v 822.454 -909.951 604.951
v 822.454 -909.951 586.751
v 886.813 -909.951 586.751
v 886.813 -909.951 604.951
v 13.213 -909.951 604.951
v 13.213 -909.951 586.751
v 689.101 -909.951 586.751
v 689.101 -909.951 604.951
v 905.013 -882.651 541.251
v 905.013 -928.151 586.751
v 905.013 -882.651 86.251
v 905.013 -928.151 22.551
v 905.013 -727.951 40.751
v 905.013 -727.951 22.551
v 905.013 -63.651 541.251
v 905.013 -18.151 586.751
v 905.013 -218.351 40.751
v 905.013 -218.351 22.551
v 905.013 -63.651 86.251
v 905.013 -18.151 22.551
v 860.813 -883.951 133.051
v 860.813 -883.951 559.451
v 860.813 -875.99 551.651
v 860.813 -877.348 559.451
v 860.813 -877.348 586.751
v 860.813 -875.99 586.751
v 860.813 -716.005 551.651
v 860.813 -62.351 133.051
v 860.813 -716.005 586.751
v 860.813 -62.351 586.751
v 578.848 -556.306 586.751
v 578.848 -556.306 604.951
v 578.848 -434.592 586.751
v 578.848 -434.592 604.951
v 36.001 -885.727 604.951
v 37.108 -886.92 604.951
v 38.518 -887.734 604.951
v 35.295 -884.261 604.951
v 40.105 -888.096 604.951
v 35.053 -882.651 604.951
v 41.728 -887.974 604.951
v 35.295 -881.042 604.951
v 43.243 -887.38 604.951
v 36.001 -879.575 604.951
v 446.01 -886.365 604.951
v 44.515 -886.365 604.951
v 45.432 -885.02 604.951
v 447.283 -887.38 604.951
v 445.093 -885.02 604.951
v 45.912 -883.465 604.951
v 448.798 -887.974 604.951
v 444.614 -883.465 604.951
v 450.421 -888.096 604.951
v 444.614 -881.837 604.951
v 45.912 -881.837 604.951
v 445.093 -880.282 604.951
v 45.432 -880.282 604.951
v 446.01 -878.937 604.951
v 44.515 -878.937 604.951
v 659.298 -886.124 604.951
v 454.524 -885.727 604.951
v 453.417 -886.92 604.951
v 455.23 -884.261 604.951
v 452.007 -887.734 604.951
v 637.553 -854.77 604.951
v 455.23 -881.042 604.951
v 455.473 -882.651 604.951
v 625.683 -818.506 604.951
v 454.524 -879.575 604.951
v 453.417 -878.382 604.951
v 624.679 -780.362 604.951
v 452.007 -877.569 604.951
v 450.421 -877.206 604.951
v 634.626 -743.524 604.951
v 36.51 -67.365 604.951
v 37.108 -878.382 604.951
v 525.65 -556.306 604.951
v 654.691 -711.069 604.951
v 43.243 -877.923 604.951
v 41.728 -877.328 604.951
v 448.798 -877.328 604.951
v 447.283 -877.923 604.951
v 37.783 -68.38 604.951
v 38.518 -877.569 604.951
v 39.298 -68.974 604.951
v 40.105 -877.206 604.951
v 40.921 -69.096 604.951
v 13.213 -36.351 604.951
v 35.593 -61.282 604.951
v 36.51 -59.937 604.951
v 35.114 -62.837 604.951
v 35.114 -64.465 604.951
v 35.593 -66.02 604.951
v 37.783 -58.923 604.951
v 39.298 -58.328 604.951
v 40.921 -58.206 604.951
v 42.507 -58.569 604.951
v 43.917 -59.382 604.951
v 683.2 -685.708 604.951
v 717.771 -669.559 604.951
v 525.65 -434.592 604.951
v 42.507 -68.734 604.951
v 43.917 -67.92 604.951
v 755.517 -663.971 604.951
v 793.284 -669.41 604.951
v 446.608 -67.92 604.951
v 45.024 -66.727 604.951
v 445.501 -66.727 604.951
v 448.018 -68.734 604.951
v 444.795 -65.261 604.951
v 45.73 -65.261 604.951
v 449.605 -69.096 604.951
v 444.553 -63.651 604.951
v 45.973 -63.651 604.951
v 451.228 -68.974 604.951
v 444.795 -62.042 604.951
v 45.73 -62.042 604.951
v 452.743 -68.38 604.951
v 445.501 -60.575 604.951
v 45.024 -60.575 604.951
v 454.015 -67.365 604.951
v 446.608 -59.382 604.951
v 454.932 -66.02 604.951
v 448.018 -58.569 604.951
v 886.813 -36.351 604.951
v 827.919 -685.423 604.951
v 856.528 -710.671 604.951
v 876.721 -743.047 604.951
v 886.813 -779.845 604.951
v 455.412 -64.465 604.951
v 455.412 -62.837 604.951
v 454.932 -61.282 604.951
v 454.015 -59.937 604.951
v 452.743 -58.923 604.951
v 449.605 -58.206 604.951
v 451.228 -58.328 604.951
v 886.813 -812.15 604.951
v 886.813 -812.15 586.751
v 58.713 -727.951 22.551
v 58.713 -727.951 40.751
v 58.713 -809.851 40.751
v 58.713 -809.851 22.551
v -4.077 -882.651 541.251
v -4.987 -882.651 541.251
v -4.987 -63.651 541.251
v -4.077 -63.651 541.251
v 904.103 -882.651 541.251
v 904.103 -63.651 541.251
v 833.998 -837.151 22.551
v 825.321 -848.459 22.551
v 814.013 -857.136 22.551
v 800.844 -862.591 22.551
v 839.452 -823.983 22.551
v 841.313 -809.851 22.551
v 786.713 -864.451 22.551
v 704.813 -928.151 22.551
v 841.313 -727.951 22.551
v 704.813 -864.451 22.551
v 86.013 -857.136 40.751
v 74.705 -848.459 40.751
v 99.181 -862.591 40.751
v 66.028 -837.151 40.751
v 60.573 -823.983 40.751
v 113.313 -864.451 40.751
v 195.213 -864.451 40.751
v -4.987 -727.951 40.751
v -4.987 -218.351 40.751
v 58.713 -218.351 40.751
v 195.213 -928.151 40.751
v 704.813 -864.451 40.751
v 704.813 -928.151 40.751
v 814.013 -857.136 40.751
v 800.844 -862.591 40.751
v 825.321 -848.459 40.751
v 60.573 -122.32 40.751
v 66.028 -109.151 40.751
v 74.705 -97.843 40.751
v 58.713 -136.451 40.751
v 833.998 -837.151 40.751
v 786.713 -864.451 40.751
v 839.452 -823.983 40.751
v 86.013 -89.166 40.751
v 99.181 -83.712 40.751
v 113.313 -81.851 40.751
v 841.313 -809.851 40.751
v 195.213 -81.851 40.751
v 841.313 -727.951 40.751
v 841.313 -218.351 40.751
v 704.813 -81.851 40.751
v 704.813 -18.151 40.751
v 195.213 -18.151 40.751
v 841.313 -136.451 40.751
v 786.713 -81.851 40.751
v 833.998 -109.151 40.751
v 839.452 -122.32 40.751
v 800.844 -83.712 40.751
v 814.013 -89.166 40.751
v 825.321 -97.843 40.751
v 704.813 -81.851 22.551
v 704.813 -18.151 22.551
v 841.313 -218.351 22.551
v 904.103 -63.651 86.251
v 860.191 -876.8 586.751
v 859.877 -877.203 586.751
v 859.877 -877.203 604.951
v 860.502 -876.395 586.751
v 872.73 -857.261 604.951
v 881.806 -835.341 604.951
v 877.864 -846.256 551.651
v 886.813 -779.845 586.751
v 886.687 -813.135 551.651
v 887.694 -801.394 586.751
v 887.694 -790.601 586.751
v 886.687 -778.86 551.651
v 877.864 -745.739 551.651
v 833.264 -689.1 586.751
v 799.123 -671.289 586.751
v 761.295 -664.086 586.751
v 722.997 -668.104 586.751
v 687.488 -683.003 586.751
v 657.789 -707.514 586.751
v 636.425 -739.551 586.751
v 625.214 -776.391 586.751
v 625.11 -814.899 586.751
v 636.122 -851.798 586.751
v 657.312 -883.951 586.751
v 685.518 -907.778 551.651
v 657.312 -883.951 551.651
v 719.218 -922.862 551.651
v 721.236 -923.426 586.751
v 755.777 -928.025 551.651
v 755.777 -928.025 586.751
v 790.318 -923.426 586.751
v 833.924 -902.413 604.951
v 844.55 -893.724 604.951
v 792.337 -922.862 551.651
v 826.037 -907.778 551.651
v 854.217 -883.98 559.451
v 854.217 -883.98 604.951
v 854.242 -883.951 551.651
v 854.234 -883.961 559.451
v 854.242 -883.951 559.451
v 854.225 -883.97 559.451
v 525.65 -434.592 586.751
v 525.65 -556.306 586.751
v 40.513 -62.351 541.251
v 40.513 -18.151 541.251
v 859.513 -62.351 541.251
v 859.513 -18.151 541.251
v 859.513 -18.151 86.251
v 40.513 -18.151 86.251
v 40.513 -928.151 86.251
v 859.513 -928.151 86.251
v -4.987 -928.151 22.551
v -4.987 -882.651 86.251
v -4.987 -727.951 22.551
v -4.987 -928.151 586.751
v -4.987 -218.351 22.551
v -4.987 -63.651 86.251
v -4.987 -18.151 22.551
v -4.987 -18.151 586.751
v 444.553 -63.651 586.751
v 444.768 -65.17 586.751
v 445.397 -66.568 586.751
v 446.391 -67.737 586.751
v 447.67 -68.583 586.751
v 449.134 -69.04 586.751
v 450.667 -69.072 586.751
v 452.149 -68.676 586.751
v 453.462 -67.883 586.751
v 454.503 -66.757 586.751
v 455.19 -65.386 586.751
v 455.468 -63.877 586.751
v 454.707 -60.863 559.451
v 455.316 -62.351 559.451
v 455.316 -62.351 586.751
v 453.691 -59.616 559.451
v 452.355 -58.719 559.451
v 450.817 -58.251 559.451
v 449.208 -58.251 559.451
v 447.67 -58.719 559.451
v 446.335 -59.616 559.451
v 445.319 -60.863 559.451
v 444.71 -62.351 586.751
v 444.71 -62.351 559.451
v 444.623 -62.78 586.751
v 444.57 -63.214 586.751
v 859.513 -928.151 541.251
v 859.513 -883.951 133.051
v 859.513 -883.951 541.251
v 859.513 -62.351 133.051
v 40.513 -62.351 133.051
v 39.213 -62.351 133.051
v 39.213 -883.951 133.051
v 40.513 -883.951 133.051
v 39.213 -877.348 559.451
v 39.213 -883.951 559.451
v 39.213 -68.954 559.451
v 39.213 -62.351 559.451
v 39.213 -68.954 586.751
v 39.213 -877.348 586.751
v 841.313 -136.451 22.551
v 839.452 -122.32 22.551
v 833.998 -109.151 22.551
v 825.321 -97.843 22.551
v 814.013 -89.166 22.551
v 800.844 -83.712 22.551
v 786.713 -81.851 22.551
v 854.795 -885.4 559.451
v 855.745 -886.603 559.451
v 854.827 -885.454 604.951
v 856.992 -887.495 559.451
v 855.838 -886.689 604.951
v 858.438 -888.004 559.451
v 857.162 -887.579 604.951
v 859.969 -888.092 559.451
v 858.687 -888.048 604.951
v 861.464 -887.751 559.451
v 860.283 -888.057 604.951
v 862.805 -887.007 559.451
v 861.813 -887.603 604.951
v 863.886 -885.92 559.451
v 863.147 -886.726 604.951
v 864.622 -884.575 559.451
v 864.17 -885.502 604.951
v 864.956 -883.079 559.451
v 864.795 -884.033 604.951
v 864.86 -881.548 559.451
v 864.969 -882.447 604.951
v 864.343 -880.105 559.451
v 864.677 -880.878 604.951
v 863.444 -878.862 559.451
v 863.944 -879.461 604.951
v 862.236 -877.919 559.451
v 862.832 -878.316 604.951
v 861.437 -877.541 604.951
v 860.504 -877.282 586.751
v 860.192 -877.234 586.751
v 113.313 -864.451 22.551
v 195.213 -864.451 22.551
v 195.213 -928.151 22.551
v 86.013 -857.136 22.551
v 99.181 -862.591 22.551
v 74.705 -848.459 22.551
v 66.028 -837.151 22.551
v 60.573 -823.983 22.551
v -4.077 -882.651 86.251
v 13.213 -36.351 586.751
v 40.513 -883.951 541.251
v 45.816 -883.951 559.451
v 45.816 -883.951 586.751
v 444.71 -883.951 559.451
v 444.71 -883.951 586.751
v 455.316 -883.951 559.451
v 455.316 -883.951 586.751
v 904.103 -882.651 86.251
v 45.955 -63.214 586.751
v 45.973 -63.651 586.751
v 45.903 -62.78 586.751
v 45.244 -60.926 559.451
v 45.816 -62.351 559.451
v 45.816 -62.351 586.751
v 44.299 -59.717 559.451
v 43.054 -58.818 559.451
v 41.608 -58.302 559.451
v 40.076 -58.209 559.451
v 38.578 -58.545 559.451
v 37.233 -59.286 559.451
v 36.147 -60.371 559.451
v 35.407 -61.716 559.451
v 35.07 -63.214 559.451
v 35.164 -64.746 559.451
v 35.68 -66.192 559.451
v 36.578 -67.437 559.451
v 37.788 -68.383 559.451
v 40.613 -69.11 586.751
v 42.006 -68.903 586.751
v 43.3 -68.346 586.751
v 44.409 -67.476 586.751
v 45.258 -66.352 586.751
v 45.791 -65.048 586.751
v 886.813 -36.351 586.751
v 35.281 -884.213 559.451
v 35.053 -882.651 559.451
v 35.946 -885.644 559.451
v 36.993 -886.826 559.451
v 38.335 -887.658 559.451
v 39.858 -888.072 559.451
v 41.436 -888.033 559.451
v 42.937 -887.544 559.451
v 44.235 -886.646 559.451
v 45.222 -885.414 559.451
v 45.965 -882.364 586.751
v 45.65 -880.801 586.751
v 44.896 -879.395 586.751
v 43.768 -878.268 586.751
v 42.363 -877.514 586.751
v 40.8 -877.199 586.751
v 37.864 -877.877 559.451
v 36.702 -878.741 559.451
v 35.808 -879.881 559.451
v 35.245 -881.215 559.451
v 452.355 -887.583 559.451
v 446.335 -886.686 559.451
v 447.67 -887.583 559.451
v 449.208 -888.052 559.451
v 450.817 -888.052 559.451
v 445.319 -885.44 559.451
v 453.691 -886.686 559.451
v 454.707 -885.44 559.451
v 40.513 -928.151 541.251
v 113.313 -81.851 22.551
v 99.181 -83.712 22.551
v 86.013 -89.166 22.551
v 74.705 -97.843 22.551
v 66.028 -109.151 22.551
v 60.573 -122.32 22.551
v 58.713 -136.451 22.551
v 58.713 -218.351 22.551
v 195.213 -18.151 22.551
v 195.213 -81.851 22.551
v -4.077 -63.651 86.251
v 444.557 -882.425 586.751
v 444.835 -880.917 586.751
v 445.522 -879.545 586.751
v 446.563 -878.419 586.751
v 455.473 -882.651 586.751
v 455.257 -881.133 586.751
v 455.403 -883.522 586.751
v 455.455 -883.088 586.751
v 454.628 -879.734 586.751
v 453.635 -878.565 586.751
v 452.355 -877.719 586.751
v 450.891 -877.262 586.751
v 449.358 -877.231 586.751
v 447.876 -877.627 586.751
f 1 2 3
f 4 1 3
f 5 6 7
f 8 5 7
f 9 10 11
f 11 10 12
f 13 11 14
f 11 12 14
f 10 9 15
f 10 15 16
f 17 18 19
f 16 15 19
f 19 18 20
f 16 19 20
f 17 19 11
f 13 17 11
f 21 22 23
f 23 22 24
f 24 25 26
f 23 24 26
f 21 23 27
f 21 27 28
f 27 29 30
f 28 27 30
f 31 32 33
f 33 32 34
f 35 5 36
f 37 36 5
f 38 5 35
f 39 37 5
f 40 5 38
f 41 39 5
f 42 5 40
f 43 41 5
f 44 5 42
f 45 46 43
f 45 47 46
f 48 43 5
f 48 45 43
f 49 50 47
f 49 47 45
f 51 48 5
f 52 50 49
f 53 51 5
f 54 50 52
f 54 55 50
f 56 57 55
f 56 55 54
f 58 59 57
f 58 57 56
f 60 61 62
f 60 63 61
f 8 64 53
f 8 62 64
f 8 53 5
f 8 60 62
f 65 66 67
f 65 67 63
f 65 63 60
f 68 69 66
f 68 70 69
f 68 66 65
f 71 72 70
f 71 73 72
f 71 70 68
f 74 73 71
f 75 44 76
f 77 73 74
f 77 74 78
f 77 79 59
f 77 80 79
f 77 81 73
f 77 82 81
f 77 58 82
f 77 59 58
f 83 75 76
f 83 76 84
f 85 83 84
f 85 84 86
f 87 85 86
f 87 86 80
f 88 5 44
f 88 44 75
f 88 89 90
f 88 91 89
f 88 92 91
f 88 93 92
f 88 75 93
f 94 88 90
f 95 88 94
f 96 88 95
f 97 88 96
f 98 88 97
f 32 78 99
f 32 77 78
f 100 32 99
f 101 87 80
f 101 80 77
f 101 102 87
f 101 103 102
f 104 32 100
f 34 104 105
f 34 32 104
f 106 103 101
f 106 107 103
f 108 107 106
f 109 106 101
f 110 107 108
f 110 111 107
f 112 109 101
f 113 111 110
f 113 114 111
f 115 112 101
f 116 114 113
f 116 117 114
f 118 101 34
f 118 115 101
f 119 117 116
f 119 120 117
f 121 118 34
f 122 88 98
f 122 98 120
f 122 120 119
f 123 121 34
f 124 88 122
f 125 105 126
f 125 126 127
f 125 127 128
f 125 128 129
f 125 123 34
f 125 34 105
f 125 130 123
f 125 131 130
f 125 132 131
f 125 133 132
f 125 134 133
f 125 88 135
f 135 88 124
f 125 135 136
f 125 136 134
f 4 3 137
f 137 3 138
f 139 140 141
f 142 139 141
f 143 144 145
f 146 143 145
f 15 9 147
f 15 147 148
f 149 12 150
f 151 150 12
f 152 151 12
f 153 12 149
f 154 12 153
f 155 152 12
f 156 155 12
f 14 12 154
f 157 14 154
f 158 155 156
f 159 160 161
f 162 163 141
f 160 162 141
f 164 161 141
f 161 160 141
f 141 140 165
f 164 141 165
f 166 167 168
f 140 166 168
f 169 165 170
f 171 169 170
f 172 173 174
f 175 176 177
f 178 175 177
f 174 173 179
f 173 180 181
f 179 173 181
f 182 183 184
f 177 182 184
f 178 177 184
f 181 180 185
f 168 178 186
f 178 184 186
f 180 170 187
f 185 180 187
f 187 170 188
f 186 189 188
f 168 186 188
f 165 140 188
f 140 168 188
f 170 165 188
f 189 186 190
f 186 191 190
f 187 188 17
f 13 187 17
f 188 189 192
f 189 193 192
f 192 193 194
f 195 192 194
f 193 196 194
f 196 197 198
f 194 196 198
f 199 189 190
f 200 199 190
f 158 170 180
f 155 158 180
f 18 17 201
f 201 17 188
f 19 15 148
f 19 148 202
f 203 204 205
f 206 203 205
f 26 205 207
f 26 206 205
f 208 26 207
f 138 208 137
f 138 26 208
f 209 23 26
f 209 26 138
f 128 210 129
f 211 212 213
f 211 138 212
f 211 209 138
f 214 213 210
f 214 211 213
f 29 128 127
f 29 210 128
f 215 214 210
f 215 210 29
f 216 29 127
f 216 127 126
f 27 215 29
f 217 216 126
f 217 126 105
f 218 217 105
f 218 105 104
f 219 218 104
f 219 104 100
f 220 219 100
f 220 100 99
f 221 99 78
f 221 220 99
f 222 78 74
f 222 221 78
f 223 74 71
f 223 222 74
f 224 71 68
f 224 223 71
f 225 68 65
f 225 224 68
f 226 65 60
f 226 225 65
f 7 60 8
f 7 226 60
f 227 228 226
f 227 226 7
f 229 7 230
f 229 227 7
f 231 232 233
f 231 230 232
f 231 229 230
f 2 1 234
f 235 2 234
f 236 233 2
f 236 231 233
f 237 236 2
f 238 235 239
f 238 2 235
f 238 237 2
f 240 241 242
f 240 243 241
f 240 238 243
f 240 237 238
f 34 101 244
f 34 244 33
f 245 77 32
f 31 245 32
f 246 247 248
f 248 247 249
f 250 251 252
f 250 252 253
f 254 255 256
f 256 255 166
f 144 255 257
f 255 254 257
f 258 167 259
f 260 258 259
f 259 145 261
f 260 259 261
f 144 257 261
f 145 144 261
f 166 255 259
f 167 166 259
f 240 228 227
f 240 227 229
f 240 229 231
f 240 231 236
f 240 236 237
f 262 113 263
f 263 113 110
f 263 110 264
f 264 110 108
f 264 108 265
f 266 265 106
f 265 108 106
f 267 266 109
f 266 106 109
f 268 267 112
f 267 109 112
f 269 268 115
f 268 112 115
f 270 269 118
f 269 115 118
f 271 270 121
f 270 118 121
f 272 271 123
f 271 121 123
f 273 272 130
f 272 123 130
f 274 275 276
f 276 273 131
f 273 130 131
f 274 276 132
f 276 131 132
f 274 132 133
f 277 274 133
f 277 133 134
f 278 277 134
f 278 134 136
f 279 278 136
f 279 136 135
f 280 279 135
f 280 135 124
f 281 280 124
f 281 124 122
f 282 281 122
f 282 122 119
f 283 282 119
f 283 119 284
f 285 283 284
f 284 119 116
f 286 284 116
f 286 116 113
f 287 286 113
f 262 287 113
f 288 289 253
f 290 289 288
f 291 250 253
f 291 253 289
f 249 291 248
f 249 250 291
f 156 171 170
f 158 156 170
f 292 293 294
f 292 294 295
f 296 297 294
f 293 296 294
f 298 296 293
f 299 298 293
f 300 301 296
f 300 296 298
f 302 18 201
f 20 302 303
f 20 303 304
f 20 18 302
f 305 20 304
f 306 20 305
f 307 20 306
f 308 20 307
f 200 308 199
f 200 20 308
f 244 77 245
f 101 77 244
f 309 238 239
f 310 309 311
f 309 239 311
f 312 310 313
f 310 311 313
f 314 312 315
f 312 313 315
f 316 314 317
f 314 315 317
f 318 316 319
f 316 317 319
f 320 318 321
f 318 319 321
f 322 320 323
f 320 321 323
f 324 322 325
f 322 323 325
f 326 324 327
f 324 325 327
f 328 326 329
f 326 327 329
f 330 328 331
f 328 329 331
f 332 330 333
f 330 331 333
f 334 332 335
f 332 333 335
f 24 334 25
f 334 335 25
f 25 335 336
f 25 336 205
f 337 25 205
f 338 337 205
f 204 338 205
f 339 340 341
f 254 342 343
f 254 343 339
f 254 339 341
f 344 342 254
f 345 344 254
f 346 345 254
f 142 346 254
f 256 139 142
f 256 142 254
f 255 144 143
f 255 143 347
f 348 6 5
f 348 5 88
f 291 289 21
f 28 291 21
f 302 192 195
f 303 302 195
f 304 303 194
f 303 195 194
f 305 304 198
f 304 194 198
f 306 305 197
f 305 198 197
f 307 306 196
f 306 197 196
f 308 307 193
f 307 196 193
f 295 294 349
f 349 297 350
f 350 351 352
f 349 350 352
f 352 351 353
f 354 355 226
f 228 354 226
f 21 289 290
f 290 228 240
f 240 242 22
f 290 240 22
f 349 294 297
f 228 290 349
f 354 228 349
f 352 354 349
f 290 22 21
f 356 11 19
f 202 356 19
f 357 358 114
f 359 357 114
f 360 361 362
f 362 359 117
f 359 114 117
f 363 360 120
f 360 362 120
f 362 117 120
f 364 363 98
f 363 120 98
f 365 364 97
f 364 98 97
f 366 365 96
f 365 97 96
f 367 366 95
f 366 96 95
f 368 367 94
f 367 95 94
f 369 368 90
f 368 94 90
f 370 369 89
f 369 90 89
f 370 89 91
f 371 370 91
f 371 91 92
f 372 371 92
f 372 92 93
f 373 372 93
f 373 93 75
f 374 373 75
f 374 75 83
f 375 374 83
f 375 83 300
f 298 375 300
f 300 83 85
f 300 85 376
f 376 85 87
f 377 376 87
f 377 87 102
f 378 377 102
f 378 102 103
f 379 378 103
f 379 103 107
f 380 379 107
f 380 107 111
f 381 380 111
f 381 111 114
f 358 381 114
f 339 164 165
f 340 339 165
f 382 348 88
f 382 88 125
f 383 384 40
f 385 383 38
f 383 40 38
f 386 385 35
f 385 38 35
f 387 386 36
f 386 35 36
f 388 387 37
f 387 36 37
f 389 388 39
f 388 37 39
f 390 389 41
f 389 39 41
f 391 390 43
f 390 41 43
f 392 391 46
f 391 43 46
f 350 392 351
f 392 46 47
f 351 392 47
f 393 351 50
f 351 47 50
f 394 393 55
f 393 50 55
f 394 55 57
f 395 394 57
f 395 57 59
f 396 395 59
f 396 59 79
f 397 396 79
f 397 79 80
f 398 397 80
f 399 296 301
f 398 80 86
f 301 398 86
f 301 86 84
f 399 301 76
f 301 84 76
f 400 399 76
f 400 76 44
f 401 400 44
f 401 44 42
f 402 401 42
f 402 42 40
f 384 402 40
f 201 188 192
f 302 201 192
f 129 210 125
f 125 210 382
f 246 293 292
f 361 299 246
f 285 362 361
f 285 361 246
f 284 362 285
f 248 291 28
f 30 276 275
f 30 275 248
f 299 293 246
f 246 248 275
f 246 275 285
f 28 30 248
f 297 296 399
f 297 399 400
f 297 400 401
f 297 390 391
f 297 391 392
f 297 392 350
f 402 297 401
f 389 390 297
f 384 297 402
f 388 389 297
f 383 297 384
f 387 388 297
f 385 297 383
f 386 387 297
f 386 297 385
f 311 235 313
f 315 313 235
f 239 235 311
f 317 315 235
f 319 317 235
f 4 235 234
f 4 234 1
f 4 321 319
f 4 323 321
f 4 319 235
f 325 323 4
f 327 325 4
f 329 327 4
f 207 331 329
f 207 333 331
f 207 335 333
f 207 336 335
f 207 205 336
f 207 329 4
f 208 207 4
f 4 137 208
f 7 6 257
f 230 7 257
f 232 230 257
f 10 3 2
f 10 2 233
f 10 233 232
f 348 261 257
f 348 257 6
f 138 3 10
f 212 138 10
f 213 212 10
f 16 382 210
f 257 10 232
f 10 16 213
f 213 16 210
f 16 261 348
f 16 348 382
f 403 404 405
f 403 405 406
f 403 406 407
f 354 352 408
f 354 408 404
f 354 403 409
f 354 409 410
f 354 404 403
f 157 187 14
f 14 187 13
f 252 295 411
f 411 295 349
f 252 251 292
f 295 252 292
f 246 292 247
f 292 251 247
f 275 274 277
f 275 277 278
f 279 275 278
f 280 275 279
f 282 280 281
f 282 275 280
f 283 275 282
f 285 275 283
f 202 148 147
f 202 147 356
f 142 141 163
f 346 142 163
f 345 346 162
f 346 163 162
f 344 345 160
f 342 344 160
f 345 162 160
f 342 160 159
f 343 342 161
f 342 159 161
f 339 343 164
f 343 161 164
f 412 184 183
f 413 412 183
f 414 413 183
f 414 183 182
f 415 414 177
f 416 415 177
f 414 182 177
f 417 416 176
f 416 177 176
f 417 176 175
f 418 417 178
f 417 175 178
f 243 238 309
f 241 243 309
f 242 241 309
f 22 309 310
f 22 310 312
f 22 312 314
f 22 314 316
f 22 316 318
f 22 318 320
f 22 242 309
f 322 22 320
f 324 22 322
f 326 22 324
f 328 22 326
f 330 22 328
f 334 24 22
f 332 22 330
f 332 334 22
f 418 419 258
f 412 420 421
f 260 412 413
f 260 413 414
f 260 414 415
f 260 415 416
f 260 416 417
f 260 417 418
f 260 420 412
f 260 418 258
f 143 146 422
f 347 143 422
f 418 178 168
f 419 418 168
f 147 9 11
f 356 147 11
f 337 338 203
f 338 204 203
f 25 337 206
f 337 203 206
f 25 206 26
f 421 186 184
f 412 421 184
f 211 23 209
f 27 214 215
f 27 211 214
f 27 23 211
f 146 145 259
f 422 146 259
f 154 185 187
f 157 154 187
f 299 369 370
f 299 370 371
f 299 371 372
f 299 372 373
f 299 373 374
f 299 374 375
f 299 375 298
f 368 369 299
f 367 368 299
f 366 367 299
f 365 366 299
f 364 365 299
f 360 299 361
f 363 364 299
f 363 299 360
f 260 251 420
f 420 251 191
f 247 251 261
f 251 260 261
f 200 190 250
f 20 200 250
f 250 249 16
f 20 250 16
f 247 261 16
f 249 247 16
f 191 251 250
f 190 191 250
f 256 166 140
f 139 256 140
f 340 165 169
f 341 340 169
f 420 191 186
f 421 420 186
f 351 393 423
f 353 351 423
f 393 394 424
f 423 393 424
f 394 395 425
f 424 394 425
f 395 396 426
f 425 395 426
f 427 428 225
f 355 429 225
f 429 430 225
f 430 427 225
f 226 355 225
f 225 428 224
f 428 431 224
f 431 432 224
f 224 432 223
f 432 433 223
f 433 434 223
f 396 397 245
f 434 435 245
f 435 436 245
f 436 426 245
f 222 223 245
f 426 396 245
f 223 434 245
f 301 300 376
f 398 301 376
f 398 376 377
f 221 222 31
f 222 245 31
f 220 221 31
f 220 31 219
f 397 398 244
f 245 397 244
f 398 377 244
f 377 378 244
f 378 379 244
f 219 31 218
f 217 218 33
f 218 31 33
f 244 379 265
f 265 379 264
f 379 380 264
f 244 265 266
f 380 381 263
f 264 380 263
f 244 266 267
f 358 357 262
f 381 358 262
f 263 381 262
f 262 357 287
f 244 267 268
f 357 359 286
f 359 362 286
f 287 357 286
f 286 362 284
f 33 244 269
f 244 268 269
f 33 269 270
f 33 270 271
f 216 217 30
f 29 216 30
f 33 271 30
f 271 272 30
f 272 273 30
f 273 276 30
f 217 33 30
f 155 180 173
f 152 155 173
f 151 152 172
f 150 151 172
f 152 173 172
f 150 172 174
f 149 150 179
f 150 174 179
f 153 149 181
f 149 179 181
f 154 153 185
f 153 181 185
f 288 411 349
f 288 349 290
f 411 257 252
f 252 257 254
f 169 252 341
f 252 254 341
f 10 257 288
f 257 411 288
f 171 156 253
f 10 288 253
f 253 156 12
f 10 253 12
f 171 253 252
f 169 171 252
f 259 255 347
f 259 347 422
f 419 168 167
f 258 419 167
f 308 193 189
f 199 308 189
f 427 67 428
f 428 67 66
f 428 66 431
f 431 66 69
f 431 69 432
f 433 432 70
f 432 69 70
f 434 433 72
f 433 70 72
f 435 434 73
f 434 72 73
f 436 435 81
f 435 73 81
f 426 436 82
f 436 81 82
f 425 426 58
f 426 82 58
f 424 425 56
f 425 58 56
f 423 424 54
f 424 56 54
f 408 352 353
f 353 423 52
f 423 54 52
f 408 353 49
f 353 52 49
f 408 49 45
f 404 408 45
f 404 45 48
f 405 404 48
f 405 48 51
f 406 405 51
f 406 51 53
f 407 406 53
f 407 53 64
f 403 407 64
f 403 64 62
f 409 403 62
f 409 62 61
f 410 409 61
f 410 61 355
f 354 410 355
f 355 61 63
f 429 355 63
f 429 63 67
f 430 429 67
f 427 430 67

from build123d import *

# Parameters (mm, degrees)
SKETCH_1_W                = 1000
SKETCH_1_H                = 1000
EXTRUDE_1_DEPTH           = 600
SKETCH_2_W                = 900
SKETCH_2_H                = 500
CUT_EXTRUDE_3_DEPTH       = 1
SKETCH_5_W                = 500
SKETCH_5_H                = 900
CUT_EXTRUDE_4_DEPTH       = 1
SKETCH_8_W                = 960
SKETCH_8_H                = 960
EXTRUDE_5_DEPTH           = 20
SKETCH_9_W                = 450
SKETCH_9_H                = 500
CUT_EXTRUDE_5_DEPTH       = 20
EXTRUDE_7_DEPTH           = 20
SKETCH_10_R               = 6
CUT_EXTRUDE_6_DEPTH       = 50
SCALE_3_SCALE             = 0.7
SKETCH_13_W               = 632
SKETCH_13_H               = 632
CUT_EXTRUDE_9_DEPTH       = 349
SKETCH_14_W               = 40.921535405
SKETCH_14_H               = 93.626348877
CUT_EXTRUDE_10_DEPTH      = 48
SKETCH_16_W               = 630
SKETCH_16_H               = 350
CUT_EXTRUDE_11_DEPTH      = 952
CUT_EXTRUDE_14_DEPTH      = 30
CUT_EXTRUDE_14_DEPTH_BACK = 41
SKETCH_17_R               = 101.559336937
SCALE_4_SCALE             = 1.3


with BuildPart() as part:
    # 草图1 → 凸台-拉伸1 (new body)
    with BuildSketch(Plane.XY):
        with Locations((450, -472.091412742)):
            Rectangle(SKETCH_1_W, SKETCH_1_H)
    extrude(amount=EXTRUDE_1_DEPTH)

    # 草图2 → 切除-拉伸3 (cut)
    with BuildSketch(Plane.XZ.offset(972.091412742)):
        with Locations((450, 300)):
            Rectangle(SKETCH_2_W, SKETCH_2_H)
    cut_extrude_3 = extrude(amount=-CUT_EXTRUDE_3_DEPTH, mode=Mode.SUBTRACT)

    # 草图5 → 切除-拉伸4 (cut)
    with BuildSketch(Plane(origin=(950, 0, 0), x_dir=(0, 0, -1), z_dir=(1, 0, 0))):
        with Locations((-300, -472.091412742)):
            Rectangle(SKETCH_5_W, SKETCH_5_H)
    cut_extrude_4 = extrude(amount=-CUT_EXTRUDE_4_DEPTH, mode=Mode.SUBTRACT)

    # 镜向1: 切除-拉伸3 across plane
    add(cut_extrude_3.mirror(Plane.ZX.offset(-472.091412742)), mode=Mode.SUBTRACT)

    # 镜向2: 切除-拉伸4 across plane
    add(cut_extrude_4.mirror(Plane.ZY.offset(-450)), mode=Mode.SUBTRACT)

    # 草图8 → 凸台-拉伸5 (add)
    with BuildSketch(Plane.XY.offset(600)):
        with Locations((450, -472.091412742)):
            Rectangle(SKETCH_8_W, SKETCH_8_H)
    extrude(amount=EXTRUDE_5_DEPTH)

    # 草图9 → 切除-拉伸5 (cut)
    with BuildSketch(Plane.XZ.offset(971.091412742)):
        with Locations((675, 300)):
            Rectangle(SKETCH_9_W, SKETCH_9_H)
    cut_extrude_5 = extrude(amount=-CUT_EXTRUDE_5_DEPTH, mode=Mode.SUBTRACT)

    # 镜向3: 切除-拉伸5 across plane
    add(cut_extrude_5.mirror(Plane.ZX.offset(-472.091412742)), mode=Mode.SUBTRACT)

    # 草图11 → 凸台-拉伸7 (add)
    with BuildSketch(Plane(origin=(0, 0, 0), x_dir=(-1, 0, 0), z_dir=(0, 0, -1))):
        with BuildLine():
            Line((-20, -192.091412742), (50, -192.091412742))
            Line((50, -192.091412742), (50, 27.908587258))
            Line((50, 27.908587258), (-170, 27.908587258))
            Line((-170, 27.908587258), (-170, -42.091412742))
            Line((-170, -42.091412742), (-80, -42.091412742))
            ThreePointArc((-80, -42.091412742), (-37.573593129, -59.665005871), (-20, -102.091412742))
            Line((-20, -102.091412742), (-20, -192.091412742))
        make_face()
        with BuildLine():
            Line((50, -972.091412742), (50, -752.091412742))
            Line((50, -752.091412742), (-20, -752.091412742))
            Line((-20, -752.091412742), (-20, -842.091412742))
            ThreePointArc((-20, -842.091412742), (-37.573593129, -884.517819614), (-80, -902.091412742))
            Line((-80, -902.091412742), (-170, -902.091412742))
            Line((-170, -902.091412742), (-170, -972.091412742))
            Line((-170, -972.091412742), (50, -972.091412742))
        make_face()
        with BuildLine():
            Line((-730, -42.091412742), (-730, 27.908587258))
            Line((-730, 27.908587258), (-950, 27.908587258))
            Line((-950, 27.908587258), (-950, -192.091412742))
            Line((-950, -192.091412742), (-880, -192.091412742))
            Line((-880, -192.091412742), (-880, -102.091412742))
            ThreePointArc((-880, -102.091412742), (-862.426406871, -59.665005871), (-820, -42.091412742))
            Line((-820, -42.091412742), (-730, -42.091412742))
        make_face()
        with BuildLine():
            Line((-950, -972.091412742), (-730, -972.091412742))
            Line((-730, -972.091412742), (-730, -902.091412742))
            Line((-730, -902.091412742), (-820, -902.091412742))
            ThreePointArc((-820, -902.091412742), (-862.426406871, -884.517819614), (-880, -842.091412742))
            Line((-880, -842.091412742), (-880, -752.091412742))
            Line((-880, -752.091412742), (-950, -752.091412742))
            Line((-950, -752.091412742), (-950, -972.091412742))
        make_face()
    extrude(amount=EXTRUDE_7_DEPTH)

    # 草图10 → 切除-拉伸6 (cut)
    with BuildSketch(Plane.XY.offset(620)):
        with Locations((450, -922.091412742)):
            Circle(SKETCH_10_R)
        with Locations((900, -922.091412742)):
            Circle(SKETCH_10_R)
        with Locations(Location((0, -922.091412742, 0), (0, 0, 180))):
            Circle(SKETCH_10_R)
        with Locations((0, -22.091412742)):
            Circle(SKETCH_10_R)
        with Locations(Location((450, -22.091412742, 0), (0, 0, 180))):
            Circle(SKETCH_10_R)
    extrude(amount=-CUT_EXTRUDE_6_DEPTH, mode=Mode.SUBTRACT)


with BuildPart() as part_1:
    # 缩放比例3: scaled about (446.683072294, -472.087239324, 308.272574941)
    add(part.part.scale(SCALE_3_SCALE).moved(Location((134.004921688, -141.626171797, 92.481772482))))

    # 草图13 → 切除-拉伸9 (cut)
    with BuildSketch(Plane.XY.offset(512.481772482)):
        with Locations((449.004921688, -472.090160717)):
            Rectangle(SKETCH_13_W, SKETCH_13_H)
    extrude(amount=-CUT_EXTRUDE_9_DEPTH, mode=Mode.SUBTRACT)

    # 草图14 → 切除-拉伸10 (cut)
    with BuildSketch(Plane.XY.offset(526.481772482)):
        with Locations((527.648380446, -489.242485135)):
            Rectangle(SKETCH_14_W, SKETCH_14_H)
    extrude(amount=-CUT_EXTRUDE_10_DEPTH, mode=Mode.SUBTRACT)

    # 草图16 → 切除-拉伸11 (cut)
    with BuildSketch(Plane(origin=(0, -122.790160717, 0), x_dir=(1, 0, 0), z_dir=(0, 1, 0))):
        with Locations((449.004921688, -302.481772482)):
            Rectangle(SKETCH_16_W, SKETCH_16_H)
    extrude(amount=-CUT_EXTRUDE_11_DEPTH, mode=Mode.SUBTRACT)

    # 草图17 → 切除-拉伸14 (cut, two sides: drawn at the far end of the back side and taken through both)
    with BuildSketch(Plane.XY.offset(526.481772482).offset(-CUT_EXTRUDE_14_DEPTH_BACK)):
        with Locations((684.208488582, -720.433496124)):
            Circle(SKETCH_17_R)
    extrude(amount=CUT_EXTRUDE_14_DEPTH + CUT_EXTRUDE_14_DEPTH_BACK, mode=Mode.SUBTRACT)


with BuildPart() as part_2:
    # 缩放比例4: scaled about (445.645805115, -468.553494774, 264.919094527)
    add(part_1.part.scale(SCALE_4_SCALE).moved(Location((-133.693741535, 140.566048432, -79.475728358))))


solid = part_2.part
